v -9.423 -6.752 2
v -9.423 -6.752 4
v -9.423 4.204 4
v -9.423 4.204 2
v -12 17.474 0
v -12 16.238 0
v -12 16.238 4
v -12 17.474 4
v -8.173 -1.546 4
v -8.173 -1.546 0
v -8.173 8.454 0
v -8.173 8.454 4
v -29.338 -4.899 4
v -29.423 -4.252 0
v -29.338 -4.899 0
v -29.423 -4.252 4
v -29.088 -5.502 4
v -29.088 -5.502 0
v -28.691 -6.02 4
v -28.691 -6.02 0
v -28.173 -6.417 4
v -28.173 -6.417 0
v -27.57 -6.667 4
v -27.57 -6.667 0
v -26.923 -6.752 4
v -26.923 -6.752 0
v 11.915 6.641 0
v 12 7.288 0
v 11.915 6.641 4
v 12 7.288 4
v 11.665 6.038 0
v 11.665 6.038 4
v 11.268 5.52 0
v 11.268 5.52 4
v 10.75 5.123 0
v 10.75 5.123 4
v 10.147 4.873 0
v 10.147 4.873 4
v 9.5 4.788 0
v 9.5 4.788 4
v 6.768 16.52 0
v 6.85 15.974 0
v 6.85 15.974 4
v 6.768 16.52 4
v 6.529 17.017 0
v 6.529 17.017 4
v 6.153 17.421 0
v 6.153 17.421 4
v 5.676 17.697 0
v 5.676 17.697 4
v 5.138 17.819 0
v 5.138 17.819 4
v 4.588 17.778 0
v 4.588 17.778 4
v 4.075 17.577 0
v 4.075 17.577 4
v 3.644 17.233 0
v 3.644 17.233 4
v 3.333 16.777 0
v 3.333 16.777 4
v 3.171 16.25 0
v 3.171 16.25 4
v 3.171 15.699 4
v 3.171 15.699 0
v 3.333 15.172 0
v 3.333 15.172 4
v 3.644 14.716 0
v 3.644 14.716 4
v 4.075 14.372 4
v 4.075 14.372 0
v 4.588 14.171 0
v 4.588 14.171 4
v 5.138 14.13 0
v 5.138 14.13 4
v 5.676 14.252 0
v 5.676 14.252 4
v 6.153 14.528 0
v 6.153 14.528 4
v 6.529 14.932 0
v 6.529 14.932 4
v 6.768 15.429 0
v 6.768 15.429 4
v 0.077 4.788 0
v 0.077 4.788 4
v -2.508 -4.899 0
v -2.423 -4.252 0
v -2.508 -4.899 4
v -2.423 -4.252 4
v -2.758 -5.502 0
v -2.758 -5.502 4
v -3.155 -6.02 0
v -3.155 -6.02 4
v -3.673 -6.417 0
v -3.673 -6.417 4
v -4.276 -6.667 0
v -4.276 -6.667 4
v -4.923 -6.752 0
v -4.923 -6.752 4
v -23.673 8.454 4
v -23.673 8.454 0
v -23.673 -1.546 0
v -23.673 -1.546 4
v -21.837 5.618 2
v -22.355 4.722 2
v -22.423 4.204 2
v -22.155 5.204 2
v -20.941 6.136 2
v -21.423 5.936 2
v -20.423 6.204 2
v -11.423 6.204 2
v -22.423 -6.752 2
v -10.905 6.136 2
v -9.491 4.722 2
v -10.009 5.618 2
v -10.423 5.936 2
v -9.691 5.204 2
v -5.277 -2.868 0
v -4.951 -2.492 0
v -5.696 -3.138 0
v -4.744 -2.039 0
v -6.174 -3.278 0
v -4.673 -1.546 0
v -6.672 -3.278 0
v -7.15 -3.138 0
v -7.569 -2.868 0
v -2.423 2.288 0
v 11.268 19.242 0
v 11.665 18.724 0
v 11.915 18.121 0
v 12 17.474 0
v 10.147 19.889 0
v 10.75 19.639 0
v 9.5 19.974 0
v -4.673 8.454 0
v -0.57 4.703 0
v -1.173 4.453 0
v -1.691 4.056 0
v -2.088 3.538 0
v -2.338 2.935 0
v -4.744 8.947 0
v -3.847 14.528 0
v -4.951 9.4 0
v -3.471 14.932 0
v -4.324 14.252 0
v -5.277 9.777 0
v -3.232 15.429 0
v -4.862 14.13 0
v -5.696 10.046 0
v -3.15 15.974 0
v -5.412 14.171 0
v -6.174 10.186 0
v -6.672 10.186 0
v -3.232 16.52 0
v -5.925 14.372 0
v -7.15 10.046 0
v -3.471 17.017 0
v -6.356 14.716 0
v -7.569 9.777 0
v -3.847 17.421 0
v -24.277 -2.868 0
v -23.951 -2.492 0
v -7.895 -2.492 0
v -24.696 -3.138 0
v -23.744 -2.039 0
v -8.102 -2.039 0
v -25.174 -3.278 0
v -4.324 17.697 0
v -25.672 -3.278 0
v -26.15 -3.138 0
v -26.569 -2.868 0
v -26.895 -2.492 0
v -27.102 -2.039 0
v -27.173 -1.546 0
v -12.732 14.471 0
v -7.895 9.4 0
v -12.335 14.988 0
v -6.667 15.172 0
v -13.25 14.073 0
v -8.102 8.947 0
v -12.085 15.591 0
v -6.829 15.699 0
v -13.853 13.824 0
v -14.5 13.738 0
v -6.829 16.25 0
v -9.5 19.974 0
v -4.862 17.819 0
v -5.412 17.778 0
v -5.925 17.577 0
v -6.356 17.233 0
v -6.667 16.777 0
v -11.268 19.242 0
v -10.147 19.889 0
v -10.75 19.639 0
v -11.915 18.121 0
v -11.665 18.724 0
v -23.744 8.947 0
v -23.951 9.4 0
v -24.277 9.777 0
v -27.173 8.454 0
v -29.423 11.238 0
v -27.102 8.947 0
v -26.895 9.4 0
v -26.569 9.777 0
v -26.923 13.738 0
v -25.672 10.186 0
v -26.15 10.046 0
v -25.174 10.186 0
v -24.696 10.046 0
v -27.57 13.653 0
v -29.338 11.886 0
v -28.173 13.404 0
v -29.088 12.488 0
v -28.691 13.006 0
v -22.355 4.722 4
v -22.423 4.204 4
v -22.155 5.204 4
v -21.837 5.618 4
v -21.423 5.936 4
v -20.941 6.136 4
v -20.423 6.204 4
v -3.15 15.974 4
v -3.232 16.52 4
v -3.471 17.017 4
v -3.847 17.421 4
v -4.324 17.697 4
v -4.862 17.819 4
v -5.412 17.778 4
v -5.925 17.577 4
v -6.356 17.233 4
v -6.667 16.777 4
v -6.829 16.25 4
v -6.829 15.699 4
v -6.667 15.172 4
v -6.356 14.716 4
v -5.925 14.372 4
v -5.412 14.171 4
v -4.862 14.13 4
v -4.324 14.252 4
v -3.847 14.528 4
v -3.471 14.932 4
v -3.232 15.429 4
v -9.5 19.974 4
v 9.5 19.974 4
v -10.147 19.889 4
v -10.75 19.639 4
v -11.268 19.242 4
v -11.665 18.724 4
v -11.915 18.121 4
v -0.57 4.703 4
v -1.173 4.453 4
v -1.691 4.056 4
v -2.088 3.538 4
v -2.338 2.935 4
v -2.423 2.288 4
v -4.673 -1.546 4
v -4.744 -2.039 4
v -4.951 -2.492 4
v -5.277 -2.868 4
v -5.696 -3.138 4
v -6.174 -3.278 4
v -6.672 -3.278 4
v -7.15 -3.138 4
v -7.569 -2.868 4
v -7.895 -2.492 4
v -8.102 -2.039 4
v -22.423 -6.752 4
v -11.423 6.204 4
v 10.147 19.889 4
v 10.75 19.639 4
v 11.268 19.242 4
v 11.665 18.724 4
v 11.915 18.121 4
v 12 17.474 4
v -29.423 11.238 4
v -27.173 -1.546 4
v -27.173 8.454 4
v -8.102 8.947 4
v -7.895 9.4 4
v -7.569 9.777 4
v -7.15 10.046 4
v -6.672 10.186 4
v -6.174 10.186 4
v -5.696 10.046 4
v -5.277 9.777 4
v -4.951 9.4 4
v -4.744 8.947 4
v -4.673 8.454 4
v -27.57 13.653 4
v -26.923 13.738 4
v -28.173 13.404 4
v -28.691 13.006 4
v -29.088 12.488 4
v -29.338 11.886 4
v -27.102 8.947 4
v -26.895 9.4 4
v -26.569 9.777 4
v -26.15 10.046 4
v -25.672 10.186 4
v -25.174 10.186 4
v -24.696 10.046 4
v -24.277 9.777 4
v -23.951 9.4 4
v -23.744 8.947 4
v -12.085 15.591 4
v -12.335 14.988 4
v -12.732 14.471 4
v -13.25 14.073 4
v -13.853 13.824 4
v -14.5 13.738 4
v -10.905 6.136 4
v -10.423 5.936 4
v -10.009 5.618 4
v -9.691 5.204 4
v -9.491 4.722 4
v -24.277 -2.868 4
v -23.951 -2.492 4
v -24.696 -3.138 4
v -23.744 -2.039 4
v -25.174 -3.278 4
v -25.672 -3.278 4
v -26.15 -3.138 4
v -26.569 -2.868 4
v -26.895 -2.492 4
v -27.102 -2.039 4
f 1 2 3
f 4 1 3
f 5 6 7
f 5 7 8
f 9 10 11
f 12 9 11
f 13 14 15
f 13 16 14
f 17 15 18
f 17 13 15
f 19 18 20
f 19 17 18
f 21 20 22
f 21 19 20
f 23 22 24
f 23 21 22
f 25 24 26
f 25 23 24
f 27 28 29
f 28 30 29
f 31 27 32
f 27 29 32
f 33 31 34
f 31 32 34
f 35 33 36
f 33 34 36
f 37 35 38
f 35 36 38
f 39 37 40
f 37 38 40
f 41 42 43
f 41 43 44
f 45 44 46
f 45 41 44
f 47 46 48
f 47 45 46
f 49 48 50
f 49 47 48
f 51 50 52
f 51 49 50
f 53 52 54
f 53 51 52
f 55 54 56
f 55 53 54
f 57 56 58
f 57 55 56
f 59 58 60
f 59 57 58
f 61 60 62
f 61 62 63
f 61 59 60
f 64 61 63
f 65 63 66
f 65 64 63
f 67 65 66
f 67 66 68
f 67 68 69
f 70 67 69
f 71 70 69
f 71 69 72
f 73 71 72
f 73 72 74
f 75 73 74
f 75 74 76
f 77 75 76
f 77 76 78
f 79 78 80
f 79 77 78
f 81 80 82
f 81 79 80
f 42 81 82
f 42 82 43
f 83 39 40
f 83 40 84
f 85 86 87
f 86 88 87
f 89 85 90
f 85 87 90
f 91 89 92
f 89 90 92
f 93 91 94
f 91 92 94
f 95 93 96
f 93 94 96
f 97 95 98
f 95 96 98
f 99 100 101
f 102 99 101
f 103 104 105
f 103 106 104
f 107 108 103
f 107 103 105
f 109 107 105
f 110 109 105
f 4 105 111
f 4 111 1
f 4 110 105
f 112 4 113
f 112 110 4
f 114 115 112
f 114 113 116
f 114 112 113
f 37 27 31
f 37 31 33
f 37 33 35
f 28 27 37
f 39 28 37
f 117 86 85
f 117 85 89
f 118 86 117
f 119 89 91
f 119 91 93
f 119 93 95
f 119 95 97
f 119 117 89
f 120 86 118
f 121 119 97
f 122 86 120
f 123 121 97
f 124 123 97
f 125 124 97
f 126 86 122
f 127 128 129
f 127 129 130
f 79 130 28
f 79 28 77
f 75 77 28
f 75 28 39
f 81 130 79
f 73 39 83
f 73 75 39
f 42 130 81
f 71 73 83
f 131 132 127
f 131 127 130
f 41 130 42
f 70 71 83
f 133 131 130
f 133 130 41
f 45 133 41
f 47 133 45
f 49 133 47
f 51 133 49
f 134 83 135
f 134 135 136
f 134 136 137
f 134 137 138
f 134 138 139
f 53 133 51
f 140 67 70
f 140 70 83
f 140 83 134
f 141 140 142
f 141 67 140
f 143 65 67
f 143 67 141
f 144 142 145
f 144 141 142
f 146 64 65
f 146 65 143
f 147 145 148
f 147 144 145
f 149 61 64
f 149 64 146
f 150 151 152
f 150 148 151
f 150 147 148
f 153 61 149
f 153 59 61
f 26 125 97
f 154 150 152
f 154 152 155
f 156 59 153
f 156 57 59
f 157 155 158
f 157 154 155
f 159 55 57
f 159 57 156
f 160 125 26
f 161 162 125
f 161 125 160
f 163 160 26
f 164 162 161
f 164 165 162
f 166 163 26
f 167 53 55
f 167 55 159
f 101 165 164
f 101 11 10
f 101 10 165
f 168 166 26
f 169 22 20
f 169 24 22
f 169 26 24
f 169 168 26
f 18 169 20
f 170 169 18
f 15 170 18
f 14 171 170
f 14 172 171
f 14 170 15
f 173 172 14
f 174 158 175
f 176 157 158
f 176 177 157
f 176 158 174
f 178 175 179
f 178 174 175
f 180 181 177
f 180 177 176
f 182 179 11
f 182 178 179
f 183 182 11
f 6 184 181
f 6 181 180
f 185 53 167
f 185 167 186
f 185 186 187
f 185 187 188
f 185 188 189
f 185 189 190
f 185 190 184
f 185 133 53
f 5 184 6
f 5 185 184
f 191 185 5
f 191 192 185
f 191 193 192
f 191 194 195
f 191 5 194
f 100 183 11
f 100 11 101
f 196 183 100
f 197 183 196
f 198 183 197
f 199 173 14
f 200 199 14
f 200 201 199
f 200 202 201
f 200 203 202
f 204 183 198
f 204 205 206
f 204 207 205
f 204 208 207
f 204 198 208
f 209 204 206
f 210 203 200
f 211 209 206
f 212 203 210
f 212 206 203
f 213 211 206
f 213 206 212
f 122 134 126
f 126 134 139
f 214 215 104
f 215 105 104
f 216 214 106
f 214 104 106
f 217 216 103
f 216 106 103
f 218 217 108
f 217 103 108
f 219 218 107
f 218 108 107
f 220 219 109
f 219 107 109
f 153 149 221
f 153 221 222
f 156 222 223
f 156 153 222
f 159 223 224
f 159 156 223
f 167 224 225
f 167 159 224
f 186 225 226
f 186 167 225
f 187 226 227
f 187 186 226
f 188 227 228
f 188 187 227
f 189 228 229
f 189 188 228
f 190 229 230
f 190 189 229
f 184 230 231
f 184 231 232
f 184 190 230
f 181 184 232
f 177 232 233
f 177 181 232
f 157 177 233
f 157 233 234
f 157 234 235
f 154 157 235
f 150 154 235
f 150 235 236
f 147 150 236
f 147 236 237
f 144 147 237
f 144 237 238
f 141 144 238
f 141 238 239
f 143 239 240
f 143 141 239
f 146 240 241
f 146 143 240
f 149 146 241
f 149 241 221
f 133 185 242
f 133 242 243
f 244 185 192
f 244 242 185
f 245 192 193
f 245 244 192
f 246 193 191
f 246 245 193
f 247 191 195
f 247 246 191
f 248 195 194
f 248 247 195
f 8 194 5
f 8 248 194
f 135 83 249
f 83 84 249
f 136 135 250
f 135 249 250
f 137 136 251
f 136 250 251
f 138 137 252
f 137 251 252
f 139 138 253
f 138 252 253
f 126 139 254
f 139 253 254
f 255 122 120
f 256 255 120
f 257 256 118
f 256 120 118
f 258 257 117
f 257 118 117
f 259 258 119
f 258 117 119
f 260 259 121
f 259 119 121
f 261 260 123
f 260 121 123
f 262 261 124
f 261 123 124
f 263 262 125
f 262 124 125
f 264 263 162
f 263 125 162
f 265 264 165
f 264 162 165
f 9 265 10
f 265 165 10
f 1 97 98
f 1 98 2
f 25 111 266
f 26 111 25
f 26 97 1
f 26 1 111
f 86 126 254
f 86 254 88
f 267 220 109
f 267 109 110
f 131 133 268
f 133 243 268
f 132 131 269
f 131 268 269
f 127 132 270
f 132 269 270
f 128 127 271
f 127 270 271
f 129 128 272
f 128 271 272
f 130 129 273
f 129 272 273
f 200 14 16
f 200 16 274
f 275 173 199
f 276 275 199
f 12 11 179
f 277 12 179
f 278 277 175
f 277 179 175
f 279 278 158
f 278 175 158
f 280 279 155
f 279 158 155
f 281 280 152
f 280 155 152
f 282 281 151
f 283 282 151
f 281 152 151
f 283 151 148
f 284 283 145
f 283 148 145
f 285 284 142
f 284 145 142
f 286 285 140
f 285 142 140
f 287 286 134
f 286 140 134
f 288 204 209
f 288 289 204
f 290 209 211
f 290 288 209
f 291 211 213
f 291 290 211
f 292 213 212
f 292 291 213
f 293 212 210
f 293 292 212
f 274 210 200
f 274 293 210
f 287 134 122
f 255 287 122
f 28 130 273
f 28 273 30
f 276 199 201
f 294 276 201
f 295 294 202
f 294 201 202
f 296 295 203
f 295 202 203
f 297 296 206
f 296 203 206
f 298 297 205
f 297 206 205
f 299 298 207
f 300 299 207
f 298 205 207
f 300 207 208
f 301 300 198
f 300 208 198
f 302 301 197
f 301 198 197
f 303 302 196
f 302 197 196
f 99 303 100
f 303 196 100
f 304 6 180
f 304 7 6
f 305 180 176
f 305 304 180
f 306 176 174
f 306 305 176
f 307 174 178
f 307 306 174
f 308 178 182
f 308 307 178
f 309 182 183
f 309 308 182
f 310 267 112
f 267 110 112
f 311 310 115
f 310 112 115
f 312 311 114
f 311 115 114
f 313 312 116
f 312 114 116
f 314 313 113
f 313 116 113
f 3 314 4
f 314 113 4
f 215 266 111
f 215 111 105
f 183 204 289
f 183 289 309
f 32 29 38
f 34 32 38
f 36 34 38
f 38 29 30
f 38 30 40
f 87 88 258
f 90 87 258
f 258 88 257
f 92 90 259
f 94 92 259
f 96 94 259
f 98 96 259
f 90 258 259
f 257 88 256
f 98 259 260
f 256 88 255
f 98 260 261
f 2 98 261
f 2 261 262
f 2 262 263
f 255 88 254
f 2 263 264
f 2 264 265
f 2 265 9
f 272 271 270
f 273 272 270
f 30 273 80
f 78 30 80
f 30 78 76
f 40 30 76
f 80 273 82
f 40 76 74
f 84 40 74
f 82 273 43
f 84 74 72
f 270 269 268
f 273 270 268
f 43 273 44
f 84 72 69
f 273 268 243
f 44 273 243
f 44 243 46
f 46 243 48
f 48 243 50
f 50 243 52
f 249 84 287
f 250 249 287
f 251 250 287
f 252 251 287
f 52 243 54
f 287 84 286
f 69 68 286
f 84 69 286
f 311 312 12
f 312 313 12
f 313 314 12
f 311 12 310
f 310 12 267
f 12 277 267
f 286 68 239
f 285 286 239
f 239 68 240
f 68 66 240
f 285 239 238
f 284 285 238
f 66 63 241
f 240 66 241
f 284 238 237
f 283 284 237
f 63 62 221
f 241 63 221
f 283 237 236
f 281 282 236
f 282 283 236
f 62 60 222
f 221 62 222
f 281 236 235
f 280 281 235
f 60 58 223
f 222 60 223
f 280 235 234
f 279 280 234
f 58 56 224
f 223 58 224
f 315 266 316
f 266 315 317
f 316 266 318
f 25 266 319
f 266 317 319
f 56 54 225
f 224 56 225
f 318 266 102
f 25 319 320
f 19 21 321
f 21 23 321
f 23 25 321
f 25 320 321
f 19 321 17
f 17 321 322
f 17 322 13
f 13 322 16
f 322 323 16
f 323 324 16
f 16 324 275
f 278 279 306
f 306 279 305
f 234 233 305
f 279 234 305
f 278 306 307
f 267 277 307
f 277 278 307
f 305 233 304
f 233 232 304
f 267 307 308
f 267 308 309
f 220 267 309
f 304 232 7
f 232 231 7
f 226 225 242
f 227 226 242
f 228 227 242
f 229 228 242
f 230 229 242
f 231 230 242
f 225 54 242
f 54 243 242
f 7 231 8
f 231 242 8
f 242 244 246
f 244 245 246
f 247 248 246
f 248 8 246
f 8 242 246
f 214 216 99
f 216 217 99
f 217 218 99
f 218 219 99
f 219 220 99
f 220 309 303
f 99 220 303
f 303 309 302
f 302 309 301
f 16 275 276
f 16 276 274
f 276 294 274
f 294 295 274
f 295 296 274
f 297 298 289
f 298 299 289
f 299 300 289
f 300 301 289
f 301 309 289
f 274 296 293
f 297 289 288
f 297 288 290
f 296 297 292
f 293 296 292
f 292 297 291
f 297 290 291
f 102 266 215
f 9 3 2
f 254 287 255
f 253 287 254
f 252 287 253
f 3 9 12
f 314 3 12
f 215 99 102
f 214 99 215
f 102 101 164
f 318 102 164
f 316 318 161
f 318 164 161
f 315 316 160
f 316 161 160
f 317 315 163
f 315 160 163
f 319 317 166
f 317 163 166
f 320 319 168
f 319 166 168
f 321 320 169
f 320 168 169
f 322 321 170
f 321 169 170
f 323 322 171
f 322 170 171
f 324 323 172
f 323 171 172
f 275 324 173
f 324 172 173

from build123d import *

# Parameters (mm, degrees)
SKETCH1_R           = 1.85
BOSS_EXTRUDE1_DEPTH = 4
FILLET1_R           = 2.5
SKETCH2_W           = 13
SKETCH2_H           = 20
CUT_EXTRUDE1_DEPTH  = 2
FILLET2_R           = 2


with BuildPart() as part:
    # Sketch1 → Boss-Extrude1 (new body)
    with BuildSketch(Plane.XY):
        Polygon((-12, 19.974398687), (12, 19.974398687), (12, 4.787936134), (-2.422914658, 4.787936134), (-2.422914658, -6.752077686), (-29.422914658, -6.752077686), (-29.422914658, 13.7384821), (-12, 13.7384821), align=None)
        with Locations((-5, 15.974398687)):
            Circle(SKETCH1_R, mode=Mode.SUBTRACT)
        with Locations((5, 15.974398687)):
            Circle(SKETCH1_R, mode=Mode.SUBTRACT)
        with BuildLine():
            Line((-4.672914658, 8.454123535), (-4.672914658, -1.545876465))
            ThreePointArc((-4.672914658, -1.545876465), (-6.422914658, -3.295876465), (-8.172914658, -1.545876465))
            Line((-8.172914658, -1.545876465), (-8.172914658, 8.454123535))
            ThreePointArc((-8.172914658, 8.454123535), (-6.422914658, 10.204123534), (-4.672914658, 8.454123535))
        make_face(mode=Mode.SUBTRACT)
        with BuildLine():
            Line((-23.672914658, 8.454123535), (-23.672914658, -1.545876465))
            ThreePointArc((-23.672914658, -1.545876465), (-25.422914658, -3.295876465), (-27.172914658, -1.545876465))
            Line((-27.172914658, -1.545876465), (-27.172914658, 8.454123535))
            ThreePointArc((-27.172914658, 8.454123535), (-25.422914658, 10.204123534), (-23.672914658, 8.454123535))
        make_face(mode=Mode.SUBTRACT)
    extrude(amount=BOSS_EXTRUDE1_DEPTH)

    # Fillet1
    fillet1_edges = [part.edges().sort_by_distance(p)[0] for p in [
        (-12, 19.974398687, 2),
        (12, 19.974398687, 2),
        (12, 4.787936134, 2),
        (-2.422914658, 4.787936134, 2),
        (-2.422914658, -6.752077686, 2),
        (-29.422914658, -6.752077686, 2),
        (-29.422914658, 13.7384821, 2),
        (-12, 13.7384821, 2),
    ]]
    fillet(fillet1_edges, radius=FILLET1_R)

    # Sketch2 → Cut-Extrude1 (cut)
    with BuildSketch(Plane.XY.offset(4)):
        with Locations((-15.922914658, -3.795876465)):
            Rectangle(SKETCH2_W, SKETCH2_H)
    extrude(amount=-CUT_EXTRUDE1_DEPTH, mode=Mode.SUBTRACT)

    # Fillet2
    fillet2_edges = [part.edges().sort_by_distance(p)[0] for p in [
        (-9.422914658, 6.204123535, 3),
        (-22.422914658, 6.204123535, 3),
    ]]
    fillet(fillet2_edges, radius=FILLET2_R)


solid = part.part
